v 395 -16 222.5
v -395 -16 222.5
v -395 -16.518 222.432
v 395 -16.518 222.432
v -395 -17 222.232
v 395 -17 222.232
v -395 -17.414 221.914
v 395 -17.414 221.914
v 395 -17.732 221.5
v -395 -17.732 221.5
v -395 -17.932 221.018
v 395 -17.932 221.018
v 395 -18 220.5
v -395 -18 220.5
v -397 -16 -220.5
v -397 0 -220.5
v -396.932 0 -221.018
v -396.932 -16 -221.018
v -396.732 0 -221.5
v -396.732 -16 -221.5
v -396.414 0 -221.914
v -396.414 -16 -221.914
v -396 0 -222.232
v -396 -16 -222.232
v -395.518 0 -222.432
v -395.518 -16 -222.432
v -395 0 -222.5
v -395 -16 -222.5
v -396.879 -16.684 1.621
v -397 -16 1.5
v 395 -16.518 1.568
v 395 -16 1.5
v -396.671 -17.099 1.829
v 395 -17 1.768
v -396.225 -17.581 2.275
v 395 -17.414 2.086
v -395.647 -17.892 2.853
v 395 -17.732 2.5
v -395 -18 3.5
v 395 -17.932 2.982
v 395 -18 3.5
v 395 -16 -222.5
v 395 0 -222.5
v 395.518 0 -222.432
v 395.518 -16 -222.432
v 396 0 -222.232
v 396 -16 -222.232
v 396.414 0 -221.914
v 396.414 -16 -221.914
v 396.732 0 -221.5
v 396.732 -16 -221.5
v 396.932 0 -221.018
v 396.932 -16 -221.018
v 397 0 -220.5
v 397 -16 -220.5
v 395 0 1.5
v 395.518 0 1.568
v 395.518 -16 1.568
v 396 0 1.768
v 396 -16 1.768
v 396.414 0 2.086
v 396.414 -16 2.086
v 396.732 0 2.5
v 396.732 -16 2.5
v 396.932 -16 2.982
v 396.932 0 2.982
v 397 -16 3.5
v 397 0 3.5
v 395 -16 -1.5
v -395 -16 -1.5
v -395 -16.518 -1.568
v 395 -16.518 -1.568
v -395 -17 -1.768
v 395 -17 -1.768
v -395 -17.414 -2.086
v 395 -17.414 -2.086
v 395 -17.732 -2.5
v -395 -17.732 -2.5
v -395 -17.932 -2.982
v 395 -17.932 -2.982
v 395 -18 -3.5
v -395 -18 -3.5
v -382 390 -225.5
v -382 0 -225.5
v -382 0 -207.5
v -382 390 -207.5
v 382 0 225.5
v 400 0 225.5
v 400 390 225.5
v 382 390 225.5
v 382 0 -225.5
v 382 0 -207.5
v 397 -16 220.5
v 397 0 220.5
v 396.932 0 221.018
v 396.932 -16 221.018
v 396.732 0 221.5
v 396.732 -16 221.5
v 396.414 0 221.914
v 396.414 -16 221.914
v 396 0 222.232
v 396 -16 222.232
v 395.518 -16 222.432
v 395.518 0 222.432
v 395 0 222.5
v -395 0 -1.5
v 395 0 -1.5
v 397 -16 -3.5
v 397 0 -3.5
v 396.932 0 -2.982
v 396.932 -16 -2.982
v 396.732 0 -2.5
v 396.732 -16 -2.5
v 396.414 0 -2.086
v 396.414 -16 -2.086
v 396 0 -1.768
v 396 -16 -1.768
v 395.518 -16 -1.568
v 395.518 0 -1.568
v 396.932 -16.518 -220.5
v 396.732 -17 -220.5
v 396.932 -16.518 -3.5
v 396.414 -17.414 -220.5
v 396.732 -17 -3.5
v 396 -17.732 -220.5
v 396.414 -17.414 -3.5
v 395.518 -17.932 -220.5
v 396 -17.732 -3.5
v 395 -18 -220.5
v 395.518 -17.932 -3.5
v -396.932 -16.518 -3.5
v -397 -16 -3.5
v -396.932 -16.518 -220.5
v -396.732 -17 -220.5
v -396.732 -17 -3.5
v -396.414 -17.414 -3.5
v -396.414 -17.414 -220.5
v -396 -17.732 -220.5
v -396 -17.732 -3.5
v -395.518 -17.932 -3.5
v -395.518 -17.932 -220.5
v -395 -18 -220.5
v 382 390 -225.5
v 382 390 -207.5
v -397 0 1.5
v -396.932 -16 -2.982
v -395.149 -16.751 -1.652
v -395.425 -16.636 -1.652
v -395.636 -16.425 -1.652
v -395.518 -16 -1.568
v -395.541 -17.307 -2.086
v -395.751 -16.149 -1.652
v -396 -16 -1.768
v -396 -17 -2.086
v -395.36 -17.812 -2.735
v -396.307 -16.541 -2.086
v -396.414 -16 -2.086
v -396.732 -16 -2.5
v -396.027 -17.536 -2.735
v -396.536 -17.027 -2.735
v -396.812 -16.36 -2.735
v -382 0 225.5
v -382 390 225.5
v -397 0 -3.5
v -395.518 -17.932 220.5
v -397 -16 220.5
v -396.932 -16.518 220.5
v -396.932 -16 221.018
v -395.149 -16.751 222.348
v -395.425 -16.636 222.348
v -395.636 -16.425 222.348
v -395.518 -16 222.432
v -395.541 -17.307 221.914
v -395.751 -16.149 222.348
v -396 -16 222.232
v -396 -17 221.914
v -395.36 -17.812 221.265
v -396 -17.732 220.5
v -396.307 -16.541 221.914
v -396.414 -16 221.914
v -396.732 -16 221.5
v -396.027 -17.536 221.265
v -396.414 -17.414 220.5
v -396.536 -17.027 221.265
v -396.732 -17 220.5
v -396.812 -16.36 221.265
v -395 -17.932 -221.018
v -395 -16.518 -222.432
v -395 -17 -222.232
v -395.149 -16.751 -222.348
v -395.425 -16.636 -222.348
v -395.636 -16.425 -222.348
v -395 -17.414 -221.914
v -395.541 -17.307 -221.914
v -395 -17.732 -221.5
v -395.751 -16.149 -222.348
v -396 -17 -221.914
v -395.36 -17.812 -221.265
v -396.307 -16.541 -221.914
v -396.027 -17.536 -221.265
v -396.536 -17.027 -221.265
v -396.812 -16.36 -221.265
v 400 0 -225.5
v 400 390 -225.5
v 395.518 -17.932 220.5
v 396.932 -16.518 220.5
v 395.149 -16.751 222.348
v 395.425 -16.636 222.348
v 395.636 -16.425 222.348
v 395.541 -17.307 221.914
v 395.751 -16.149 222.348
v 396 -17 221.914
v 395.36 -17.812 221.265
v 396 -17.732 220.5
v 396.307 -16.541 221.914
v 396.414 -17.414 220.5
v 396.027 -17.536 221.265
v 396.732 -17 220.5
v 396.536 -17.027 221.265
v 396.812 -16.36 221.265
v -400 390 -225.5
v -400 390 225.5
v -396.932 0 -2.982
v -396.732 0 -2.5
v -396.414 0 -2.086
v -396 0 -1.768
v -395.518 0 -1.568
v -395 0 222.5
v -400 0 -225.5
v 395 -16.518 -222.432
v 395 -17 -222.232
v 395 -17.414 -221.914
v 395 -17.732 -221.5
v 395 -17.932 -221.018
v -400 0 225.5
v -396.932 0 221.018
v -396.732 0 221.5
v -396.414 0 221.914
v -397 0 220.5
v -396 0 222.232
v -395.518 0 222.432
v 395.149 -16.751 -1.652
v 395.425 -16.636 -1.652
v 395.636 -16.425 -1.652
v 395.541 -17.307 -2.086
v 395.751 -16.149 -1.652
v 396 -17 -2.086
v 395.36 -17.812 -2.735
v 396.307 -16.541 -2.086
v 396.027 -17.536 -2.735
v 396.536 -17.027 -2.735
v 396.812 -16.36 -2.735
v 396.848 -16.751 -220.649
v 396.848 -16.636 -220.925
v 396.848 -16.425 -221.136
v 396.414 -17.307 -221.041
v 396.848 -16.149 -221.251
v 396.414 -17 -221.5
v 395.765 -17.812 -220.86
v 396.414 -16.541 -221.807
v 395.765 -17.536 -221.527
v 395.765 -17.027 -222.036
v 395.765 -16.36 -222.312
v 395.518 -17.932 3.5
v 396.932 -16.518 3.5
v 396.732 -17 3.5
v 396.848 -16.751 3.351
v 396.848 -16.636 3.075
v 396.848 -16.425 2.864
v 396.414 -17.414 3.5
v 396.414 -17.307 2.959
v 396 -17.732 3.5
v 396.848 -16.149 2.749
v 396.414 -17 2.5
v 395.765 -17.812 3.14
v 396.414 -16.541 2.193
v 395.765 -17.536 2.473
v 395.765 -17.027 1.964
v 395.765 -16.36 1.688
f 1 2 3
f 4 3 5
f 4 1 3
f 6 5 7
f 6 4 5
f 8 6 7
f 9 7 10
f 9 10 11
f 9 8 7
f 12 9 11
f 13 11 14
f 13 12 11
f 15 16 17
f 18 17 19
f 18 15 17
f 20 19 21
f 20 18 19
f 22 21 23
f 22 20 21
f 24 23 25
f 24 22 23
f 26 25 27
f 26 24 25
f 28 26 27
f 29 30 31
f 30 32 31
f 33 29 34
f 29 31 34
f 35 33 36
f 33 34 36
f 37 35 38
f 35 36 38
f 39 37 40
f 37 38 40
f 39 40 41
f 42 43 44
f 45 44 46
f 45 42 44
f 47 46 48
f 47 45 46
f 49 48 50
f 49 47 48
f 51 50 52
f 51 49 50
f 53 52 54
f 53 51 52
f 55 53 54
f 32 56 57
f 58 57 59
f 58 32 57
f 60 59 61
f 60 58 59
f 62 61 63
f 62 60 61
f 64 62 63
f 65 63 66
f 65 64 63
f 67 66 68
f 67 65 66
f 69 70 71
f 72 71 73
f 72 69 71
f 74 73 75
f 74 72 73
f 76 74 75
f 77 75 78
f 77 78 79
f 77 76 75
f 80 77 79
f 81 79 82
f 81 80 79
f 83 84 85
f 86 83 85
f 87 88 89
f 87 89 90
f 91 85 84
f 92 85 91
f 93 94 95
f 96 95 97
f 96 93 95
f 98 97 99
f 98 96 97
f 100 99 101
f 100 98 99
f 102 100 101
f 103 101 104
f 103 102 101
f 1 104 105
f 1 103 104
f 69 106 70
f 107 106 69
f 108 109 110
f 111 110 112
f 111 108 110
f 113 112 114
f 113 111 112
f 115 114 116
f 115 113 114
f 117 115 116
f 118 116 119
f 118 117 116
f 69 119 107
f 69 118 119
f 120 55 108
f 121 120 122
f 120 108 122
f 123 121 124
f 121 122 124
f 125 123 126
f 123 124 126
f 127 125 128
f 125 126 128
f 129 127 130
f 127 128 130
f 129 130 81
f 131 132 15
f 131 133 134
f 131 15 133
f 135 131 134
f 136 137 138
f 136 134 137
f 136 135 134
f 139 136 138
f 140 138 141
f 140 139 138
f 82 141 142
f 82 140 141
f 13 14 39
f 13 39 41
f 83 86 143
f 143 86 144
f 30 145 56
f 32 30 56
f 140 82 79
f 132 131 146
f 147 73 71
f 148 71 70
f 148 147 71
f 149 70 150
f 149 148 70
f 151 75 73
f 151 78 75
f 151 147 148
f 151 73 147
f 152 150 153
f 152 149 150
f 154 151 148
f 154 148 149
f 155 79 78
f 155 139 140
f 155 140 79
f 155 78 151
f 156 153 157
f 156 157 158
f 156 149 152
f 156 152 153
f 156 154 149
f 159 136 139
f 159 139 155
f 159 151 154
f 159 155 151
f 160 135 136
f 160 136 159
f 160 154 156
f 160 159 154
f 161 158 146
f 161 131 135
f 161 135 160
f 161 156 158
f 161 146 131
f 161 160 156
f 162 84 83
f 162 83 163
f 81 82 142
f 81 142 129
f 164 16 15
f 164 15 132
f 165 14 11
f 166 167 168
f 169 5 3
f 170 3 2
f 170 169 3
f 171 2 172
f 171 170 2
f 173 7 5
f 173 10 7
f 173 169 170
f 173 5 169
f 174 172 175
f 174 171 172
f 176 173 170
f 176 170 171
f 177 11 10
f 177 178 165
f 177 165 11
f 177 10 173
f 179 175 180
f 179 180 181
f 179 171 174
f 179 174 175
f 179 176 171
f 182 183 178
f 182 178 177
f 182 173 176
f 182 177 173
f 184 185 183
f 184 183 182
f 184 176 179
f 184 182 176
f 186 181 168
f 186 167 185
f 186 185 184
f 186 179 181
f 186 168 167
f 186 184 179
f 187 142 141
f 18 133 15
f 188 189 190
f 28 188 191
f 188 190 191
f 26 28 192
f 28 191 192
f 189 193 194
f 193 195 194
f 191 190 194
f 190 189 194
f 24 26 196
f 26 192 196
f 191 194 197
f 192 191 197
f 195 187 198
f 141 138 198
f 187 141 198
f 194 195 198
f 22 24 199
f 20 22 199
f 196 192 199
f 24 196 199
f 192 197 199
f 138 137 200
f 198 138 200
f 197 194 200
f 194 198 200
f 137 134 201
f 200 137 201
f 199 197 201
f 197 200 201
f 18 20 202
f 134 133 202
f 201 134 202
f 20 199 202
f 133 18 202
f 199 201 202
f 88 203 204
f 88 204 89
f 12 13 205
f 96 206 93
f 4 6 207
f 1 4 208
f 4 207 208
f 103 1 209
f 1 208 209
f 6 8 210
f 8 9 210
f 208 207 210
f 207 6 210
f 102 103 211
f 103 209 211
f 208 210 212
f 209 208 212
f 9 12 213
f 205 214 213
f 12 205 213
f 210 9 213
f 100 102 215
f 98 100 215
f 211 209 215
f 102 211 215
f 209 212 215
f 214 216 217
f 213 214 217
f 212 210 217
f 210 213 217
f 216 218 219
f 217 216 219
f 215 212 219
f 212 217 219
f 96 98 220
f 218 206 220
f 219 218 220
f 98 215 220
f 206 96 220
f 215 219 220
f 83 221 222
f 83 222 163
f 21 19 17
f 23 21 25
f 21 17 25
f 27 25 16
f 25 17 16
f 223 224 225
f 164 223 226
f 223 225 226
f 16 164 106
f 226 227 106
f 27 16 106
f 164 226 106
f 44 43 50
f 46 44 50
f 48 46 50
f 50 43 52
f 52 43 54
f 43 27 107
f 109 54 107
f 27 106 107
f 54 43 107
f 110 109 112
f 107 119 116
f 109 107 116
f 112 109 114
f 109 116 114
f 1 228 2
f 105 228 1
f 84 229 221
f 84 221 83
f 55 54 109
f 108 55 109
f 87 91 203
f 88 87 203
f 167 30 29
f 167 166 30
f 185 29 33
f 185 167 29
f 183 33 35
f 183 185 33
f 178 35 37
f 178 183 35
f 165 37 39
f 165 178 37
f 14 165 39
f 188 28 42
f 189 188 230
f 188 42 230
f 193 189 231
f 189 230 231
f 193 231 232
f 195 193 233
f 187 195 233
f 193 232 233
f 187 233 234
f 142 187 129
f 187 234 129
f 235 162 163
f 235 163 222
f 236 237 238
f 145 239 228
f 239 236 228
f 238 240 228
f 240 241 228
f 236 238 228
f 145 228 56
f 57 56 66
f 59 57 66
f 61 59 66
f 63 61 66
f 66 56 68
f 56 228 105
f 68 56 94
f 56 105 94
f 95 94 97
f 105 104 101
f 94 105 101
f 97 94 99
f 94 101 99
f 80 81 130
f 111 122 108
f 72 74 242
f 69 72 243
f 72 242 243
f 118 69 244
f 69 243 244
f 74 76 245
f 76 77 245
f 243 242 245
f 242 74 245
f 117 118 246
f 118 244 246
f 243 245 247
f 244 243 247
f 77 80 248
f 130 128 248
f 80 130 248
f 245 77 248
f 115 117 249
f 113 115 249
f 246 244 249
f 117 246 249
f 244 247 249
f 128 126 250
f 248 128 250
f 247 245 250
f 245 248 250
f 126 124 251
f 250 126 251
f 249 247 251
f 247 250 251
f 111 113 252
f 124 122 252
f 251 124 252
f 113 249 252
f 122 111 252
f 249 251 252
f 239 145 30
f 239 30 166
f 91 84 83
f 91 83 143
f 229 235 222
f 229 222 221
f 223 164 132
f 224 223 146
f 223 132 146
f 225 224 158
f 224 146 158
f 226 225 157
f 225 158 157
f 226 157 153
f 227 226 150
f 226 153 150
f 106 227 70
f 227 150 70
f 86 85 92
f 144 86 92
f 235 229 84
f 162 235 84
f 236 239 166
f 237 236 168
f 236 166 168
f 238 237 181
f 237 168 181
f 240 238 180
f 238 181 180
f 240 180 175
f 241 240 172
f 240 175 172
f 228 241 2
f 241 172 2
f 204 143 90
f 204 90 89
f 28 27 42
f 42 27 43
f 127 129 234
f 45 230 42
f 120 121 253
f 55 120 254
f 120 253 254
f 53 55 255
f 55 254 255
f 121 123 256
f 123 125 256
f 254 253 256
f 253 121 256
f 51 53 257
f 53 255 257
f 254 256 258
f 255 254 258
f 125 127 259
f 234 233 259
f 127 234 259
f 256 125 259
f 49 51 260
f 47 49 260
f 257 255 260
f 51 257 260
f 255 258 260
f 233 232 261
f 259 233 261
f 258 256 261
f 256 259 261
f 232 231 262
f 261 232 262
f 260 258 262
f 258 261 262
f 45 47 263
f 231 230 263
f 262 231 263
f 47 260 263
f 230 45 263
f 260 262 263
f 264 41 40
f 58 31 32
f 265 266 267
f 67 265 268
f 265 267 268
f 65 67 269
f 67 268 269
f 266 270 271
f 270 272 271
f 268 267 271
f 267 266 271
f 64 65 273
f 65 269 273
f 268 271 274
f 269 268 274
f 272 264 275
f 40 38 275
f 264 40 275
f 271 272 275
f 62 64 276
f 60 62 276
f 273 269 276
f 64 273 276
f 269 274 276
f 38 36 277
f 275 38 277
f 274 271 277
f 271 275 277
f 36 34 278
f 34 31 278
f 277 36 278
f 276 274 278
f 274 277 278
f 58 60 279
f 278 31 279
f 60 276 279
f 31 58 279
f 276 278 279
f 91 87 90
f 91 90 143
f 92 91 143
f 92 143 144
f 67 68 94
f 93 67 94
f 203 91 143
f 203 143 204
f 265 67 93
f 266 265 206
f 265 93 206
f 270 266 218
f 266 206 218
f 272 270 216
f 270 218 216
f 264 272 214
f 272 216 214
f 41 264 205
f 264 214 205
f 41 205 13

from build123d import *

# Parameters (mm, degrees)
F1_DEPTH = 390
F0_W     = 764
F0_H     = 18
F2_DEPTH = 390
F3_W     = 794
F3_H     = 221
F4_DEPTH = 18
F5_R     = 2


with BuildPart() as f1:
    # F0 (on Front) → F1 (new body)
    with BuildSketch(Plane.XZ):
        Polygon((-382, -207.5), (-382, 225.5), (-400, 225.5), (-400, -225.5), (-382, -225.5), align=None)
        Polygon((400, -225.5), (400, 225.5), (382, 225.5), (382, -207.5), (382, -225.5), align=None)
    extrude(amount=-F1_DEPTH)


with BuildPart() as f2:
    # F0 (on Front) → F2 (new body)
    with BuildSketch(Plane.XZ):
        with Locations((0, -216.5)):
            Rectangle(F0_W, F0_H)
    extrude(amount=-F2_DEPTH)


with BuildPart() as f4:
    # F3 (on Front) → F4 (new body)
    with BuildSketch(Plane.XZ):
        with Locations((0, 112)):
            Rectangle(F3_W, F3_H)
        with Locations((0, -112)):
            Rectangle(F3_W, F3_H)
    extrude(amount=F4_DEPTH)

    # F5
    f5_edges = [f4.edges().sort_by_distance(p)[0] for p in [
        (-397, -18, 112),
        (0, -18, 1.5),
        (397, -18, 112),
        (0, -18, 222.5),
        (-397, -18, -112),
        (0, -18, -222.5),
        (397, -18, -112),
        (0, -18, -1.5),
        (397, -9, 222.5),
        (-397, -9, 222.5),
        (397, -9, -222.5),
        (397, -9, -1.5),
        (397, -9, 1.5),
        (-397, -9, -222.5),
        (-397, -9, -1.5),
    ]]
    fillet(f5_edges, radius=F5_R)


solid = Compound([f1.part, f2.part, f4.part])
